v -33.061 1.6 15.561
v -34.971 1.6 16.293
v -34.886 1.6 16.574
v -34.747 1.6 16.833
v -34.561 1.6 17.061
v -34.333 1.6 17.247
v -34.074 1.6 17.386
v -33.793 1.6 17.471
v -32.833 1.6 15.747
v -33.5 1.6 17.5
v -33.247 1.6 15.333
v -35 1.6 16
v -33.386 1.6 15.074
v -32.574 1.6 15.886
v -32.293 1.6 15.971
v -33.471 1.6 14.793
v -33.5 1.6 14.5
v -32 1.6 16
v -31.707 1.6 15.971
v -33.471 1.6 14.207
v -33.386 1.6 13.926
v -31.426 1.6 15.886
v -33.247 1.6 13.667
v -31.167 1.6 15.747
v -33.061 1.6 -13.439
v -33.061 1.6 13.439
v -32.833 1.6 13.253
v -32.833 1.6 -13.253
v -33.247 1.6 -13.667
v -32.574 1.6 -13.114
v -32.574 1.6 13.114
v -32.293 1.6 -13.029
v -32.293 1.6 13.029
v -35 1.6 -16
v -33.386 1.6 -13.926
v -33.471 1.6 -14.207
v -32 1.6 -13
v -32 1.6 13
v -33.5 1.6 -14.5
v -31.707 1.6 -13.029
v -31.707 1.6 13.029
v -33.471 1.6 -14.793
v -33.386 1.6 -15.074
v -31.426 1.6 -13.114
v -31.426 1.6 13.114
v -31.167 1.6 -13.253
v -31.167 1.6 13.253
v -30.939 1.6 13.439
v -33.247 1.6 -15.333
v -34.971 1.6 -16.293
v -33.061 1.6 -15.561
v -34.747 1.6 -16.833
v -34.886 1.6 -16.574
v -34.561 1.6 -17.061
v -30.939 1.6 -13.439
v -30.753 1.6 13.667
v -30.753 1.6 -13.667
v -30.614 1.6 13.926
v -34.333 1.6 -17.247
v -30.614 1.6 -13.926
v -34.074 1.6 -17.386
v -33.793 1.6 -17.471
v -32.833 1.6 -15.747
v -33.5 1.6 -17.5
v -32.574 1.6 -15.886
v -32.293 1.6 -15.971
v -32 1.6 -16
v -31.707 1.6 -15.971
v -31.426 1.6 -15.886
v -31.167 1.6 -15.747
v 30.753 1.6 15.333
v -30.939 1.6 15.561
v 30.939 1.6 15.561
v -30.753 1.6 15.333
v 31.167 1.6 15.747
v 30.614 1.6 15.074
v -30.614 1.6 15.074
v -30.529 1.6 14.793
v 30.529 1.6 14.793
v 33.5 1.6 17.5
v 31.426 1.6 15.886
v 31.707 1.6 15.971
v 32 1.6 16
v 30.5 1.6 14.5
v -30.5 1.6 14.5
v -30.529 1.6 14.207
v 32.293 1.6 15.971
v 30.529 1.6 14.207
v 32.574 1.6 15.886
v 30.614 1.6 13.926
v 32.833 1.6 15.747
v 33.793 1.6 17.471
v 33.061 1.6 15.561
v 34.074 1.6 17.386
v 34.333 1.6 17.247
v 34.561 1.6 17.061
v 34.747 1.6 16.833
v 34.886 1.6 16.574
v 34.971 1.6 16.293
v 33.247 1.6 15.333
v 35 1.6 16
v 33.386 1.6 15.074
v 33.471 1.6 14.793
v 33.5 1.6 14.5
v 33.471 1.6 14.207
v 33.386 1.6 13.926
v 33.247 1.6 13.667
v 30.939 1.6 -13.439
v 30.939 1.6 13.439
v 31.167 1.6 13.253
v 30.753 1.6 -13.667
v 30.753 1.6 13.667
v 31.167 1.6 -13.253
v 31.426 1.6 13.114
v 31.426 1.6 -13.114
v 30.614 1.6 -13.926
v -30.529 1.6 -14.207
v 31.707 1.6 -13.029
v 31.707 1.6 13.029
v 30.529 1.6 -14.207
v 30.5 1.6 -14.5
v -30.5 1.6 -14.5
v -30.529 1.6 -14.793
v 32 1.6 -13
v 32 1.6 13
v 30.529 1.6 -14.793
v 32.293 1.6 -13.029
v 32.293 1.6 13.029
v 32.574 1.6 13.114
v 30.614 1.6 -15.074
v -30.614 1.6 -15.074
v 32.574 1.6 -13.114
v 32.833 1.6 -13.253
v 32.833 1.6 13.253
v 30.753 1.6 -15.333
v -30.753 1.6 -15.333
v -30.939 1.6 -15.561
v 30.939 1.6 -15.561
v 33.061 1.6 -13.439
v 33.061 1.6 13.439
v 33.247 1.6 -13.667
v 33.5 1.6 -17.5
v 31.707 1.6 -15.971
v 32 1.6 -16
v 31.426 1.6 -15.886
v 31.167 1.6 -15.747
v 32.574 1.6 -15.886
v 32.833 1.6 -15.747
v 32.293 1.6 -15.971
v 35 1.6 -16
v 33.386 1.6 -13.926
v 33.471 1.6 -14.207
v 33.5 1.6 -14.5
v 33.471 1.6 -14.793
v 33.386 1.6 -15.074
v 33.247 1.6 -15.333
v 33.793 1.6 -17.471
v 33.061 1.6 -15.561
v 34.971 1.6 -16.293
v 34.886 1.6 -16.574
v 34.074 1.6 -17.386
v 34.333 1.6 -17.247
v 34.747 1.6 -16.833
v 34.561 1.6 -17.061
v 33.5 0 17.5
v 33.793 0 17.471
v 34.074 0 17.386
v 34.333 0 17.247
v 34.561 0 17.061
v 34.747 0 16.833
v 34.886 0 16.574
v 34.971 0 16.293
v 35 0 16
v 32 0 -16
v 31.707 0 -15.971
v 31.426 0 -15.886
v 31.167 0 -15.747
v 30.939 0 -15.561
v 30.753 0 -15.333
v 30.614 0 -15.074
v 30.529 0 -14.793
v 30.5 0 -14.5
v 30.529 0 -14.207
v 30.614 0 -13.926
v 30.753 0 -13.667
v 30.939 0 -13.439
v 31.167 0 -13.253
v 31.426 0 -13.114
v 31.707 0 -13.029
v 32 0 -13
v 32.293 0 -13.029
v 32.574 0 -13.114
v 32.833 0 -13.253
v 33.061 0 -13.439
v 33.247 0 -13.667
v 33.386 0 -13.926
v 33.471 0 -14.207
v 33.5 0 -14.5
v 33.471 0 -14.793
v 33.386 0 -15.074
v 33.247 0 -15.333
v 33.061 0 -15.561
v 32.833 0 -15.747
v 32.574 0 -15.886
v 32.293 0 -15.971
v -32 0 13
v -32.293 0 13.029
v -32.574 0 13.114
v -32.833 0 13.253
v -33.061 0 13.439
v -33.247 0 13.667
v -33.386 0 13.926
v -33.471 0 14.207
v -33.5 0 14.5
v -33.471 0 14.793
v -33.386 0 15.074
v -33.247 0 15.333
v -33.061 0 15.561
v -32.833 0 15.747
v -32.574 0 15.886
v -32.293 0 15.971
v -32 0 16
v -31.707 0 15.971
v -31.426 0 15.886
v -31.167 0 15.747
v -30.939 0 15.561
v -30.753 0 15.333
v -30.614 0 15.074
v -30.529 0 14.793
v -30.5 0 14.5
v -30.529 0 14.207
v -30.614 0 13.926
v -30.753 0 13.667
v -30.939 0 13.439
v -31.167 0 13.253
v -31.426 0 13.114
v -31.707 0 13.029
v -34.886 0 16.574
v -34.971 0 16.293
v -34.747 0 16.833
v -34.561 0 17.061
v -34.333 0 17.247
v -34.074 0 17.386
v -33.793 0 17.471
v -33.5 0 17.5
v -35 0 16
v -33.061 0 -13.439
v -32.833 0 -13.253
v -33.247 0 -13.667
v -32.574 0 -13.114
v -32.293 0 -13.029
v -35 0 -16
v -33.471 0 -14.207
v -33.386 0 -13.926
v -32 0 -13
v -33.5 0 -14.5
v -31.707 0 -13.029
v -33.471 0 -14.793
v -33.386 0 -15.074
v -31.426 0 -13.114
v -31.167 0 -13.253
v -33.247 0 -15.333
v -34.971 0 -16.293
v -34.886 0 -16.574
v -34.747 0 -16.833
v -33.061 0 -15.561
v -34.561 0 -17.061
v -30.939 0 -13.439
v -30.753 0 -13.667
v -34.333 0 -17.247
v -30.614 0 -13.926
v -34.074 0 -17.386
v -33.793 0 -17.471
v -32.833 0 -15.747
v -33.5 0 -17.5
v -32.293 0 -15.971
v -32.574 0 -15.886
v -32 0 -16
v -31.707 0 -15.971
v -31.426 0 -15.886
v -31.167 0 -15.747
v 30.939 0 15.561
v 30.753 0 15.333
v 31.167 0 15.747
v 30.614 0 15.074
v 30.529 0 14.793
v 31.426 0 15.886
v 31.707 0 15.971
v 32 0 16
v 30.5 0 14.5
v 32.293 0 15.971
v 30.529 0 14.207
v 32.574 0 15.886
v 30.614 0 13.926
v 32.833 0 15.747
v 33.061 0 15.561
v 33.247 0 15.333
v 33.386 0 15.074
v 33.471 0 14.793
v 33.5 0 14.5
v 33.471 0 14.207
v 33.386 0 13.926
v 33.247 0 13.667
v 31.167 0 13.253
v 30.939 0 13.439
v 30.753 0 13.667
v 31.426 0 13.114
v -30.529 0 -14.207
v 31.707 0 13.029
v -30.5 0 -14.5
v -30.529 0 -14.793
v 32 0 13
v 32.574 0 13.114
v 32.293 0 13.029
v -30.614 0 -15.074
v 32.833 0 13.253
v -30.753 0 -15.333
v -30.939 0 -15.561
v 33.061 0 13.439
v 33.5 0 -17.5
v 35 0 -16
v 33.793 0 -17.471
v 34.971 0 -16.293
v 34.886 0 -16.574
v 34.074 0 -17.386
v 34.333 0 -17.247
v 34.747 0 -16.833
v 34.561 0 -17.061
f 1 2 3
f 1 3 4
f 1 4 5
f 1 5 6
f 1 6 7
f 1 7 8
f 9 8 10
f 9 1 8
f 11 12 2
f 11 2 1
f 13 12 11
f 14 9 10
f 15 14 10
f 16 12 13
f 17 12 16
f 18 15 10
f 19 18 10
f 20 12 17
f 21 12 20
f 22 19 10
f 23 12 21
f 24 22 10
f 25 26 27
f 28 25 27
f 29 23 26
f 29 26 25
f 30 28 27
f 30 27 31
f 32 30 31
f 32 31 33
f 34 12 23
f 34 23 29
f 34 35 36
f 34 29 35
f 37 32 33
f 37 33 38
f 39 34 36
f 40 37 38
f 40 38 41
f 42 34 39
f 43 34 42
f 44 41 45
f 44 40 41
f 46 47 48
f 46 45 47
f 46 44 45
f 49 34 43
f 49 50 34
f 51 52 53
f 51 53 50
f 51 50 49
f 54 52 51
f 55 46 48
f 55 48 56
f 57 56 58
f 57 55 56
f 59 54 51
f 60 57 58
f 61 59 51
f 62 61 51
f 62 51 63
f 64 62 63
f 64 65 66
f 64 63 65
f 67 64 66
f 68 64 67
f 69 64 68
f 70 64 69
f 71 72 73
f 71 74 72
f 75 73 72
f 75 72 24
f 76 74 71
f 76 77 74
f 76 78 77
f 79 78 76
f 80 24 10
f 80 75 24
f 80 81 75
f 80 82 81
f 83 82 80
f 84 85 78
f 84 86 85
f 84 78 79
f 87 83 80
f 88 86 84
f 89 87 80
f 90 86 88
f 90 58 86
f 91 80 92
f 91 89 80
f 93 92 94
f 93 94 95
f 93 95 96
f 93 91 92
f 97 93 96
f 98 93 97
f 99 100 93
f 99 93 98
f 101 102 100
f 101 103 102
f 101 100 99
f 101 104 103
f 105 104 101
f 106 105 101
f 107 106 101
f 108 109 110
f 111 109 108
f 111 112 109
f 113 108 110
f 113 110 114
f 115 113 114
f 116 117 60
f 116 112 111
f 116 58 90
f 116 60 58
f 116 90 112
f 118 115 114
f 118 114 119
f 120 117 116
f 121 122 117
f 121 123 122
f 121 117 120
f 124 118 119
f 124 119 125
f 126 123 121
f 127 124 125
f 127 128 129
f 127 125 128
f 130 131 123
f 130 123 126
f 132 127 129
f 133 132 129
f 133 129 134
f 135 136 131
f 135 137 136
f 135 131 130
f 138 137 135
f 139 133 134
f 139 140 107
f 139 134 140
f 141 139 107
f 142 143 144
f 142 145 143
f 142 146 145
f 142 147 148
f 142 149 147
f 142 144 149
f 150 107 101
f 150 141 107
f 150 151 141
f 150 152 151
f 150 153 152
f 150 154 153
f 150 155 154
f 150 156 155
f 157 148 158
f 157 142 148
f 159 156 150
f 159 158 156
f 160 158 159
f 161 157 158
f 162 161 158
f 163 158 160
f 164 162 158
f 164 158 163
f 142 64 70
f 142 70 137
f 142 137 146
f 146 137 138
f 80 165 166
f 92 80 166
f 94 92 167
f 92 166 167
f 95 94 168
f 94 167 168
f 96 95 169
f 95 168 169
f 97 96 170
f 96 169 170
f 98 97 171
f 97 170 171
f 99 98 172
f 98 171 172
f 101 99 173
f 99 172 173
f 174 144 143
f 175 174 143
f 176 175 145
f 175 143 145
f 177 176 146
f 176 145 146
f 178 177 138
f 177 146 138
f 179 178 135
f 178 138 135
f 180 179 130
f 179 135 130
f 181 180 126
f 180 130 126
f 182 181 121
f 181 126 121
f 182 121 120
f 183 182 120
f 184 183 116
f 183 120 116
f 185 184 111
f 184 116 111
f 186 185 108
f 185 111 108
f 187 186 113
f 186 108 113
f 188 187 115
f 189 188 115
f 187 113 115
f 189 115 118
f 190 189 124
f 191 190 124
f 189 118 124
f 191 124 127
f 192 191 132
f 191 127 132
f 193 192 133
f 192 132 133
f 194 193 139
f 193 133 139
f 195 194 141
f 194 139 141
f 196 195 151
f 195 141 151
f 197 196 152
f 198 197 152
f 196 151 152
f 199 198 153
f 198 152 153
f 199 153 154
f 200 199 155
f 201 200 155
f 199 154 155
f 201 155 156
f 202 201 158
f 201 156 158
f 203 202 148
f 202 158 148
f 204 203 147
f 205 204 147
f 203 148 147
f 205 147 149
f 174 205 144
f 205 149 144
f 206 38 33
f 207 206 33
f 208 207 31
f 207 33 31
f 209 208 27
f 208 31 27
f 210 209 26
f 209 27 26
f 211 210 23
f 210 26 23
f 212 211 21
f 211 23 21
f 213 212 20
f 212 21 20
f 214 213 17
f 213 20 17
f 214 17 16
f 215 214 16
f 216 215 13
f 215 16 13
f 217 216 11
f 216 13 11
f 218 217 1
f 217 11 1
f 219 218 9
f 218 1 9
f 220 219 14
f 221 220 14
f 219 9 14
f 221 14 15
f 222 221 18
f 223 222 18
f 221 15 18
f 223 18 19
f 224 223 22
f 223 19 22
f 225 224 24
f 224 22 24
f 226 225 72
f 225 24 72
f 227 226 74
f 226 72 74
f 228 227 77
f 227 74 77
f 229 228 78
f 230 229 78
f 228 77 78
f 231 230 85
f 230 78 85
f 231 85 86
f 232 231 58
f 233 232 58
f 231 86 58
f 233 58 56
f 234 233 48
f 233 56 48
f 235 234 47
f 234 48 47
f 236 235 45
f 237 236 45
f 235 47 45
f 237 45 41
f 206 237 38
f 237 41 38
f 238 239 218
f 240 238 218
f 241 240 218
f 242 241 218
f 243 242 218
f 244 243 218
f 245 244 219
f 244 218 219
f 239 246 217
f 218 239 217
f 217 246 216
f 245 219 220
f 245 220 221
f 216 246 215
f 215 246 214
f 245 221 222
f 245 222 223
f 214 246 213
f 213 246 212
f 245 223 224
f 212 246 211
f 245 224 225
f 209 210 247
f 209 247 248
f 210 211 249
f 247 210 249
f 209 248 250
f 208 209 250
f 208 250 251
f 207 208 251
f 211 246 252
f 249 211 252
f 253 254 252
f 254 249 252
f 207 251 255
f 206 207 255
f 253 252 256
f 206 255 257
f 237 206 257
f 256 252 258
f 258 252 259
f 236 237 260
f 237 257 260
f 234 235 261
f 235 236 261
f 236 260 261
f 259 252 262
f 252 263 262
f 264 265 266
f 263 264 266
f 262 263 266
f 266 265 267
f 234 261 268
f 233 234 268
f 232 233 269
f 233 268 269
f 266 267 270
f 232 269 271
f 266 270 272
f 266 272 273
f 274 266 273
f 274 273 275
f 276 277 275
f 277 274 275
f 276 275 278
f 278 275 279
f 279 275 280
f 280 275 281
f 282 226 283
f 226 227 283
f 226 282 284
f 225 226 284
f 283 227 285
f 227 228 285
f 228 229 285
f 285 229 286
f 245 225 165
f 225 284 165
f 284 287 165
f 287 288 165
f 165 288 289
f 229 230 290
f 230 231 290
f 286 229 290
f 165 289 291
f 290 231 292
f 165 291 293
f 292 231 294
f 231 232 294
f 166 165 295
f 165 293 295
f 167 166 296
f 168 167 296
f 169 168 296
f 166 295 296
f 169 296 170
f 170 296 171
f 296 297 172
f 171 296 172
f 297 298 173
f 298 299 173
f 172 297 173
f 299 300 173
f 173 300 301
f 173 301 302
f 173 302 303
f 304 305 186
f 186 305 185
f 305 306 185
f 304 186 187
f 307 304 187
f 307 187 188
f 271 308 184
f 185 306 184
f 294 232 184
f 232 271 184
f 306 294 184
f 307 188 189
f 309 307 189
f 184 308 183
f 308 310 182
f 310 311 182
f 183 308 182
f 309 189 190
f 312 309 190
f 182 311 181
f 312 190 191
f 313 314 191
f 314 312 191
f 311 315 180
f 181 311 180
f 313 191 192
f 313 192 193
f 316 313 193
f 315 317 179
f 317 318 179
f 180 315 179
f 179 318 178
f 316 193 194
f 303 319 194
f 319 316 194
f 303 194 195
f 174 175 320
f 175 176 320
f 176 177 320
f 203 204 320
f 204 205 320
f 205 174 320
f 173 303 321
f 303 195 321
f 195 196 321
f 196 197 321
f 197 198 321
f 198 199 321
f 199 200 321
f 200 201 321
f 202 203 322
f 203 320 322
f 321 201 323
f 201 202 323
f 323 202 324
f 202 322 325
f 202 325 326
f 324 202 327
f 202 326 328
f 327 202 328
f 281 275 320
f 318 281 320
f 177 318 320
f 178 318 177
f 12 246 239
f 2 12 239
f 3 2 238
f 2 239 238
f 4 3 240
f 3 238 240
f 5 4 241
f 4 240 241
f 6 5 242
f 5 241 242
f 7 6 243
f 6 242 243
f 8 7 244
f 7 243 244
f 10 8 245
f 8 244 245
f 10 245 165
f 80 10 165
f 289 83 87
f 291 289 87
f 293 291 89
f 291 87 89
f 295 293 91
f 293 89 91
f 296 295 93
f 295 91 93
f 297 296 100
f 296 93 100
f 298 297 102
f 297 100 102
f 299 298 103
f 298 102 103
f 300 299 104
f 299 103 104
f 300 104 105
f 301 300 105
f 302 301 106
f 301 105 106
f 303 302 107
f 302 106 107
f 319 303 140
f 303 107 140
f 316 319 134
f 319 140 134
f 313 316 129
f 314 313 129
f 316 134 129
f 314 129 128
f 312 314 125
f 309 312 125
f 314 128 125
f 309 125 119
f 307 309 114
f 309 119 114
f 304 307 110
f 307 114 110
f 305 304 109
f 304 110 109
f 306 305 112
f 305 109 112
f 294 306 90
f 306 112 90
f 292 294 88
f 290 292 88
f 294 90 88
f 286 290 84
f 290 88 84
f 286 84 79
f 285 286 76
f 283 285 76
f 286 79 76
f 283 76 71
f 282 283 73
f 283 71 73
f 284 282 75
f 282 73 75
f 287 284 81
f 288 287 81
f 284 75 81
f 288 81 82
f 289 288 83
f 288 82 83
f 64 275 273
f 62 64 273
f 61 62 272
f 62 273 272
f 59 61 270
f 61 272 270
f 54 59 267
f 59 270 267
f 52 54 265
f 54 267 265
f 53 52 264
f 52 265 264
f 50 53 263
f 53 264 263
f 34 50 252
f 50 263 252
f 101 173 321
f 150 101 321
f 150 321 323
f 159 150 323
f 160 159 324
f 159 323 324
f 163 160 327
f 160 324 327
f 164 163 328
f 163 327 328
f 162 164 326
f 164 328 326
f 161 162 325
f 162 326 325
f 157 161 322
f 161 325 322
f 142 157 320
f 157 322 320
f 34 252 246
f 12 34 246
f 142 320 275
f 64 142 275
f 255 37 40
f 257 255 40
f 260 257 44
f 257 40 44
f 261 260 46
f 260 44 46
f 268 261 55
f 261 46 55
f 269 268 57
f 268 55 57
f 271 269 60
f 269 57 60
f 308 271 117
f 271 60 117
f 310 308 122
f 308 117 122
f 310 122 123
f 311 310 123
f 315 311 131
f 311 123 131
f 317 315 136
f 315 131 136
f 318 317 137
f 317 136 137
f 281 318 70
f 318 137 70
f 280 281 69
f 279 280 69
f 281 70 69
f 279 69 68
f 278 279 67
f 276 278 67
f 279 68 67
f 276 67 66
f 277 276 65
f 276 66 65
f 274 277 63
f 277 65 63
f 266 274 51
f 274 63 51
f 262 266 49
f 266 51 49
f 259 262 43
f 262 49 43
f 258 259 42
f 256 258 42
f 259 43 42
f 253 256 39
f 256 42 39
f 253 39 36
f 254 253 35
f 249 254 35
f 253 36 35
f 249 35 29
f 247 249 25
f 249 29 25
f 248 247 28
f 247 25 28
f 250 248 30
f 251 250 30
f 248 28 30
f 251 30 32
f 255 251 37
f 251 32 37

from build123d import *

# Parameters (mm, degrees)
PCB_BASE_DEPTH       = 1.6
SKETCH2_R            = 1.5
MOUNTING_HOLES_DEPTH = 1.6


with BuildPart() as part:
    # Sketch1 → PCB Base (new body)
    with BuildSketch(Plane(origin=(0, 0, 0), x_dir=(1, 0, 0), z_dir=(0, 1, 0))):
        with BuildLine():
            Line((-33.5, -17.5), (33.5, -17.5))
            ThreePointArc((33.5, -17.5), (34.560660172, -17.060660172), (35, -16))
            Line((35, -16), (35, 16))
            ThreePointArc((35, 16), (34.560660172, 17.060660172), (33.5, 17.5))
            Line((33.5, 17.5), (-33.5, 17.5))
            ThreePointArc((-33.5, 17.5), (-34.560660172, 17.060660172), (-35, 16))
            Line((-35, 16), (-35, -16))
            ThreePointArc((-35, -16), (-34.560660172, -17.060660172), (-33.5, -17.5))
        make_face()
    extrude(amount=PCB_BASE_DEPTH)

    # Sketch2 → Mounting Holes (cut)
    with BuildSketch(Plane(origin=(0, 1.6, 0), x_dir=(1, 0, 0), z_dir=(0, 1, 0))):
        with Locations(Location((-32, 14.5, 0), (0, 0, 270))):
            Circle(SKETCH2_R)
        with Locations(Location((32, 14.5, 0), (0, 0, 90))):
            Circle(SKETCH2_R)
        with Locations(Location((32, -14.5, 0), (0, 0, 270))):
            Circle(SKETCH2_R)
        with Locations(Location((-32, -14.5, 0), (0, 0, 90))):
            Circle(SKETCH2_R)
    extrude(amount=-MOUNTING_HOLES_DEPTH, mode=Mode.SUBTRACT)


solid = part.part
